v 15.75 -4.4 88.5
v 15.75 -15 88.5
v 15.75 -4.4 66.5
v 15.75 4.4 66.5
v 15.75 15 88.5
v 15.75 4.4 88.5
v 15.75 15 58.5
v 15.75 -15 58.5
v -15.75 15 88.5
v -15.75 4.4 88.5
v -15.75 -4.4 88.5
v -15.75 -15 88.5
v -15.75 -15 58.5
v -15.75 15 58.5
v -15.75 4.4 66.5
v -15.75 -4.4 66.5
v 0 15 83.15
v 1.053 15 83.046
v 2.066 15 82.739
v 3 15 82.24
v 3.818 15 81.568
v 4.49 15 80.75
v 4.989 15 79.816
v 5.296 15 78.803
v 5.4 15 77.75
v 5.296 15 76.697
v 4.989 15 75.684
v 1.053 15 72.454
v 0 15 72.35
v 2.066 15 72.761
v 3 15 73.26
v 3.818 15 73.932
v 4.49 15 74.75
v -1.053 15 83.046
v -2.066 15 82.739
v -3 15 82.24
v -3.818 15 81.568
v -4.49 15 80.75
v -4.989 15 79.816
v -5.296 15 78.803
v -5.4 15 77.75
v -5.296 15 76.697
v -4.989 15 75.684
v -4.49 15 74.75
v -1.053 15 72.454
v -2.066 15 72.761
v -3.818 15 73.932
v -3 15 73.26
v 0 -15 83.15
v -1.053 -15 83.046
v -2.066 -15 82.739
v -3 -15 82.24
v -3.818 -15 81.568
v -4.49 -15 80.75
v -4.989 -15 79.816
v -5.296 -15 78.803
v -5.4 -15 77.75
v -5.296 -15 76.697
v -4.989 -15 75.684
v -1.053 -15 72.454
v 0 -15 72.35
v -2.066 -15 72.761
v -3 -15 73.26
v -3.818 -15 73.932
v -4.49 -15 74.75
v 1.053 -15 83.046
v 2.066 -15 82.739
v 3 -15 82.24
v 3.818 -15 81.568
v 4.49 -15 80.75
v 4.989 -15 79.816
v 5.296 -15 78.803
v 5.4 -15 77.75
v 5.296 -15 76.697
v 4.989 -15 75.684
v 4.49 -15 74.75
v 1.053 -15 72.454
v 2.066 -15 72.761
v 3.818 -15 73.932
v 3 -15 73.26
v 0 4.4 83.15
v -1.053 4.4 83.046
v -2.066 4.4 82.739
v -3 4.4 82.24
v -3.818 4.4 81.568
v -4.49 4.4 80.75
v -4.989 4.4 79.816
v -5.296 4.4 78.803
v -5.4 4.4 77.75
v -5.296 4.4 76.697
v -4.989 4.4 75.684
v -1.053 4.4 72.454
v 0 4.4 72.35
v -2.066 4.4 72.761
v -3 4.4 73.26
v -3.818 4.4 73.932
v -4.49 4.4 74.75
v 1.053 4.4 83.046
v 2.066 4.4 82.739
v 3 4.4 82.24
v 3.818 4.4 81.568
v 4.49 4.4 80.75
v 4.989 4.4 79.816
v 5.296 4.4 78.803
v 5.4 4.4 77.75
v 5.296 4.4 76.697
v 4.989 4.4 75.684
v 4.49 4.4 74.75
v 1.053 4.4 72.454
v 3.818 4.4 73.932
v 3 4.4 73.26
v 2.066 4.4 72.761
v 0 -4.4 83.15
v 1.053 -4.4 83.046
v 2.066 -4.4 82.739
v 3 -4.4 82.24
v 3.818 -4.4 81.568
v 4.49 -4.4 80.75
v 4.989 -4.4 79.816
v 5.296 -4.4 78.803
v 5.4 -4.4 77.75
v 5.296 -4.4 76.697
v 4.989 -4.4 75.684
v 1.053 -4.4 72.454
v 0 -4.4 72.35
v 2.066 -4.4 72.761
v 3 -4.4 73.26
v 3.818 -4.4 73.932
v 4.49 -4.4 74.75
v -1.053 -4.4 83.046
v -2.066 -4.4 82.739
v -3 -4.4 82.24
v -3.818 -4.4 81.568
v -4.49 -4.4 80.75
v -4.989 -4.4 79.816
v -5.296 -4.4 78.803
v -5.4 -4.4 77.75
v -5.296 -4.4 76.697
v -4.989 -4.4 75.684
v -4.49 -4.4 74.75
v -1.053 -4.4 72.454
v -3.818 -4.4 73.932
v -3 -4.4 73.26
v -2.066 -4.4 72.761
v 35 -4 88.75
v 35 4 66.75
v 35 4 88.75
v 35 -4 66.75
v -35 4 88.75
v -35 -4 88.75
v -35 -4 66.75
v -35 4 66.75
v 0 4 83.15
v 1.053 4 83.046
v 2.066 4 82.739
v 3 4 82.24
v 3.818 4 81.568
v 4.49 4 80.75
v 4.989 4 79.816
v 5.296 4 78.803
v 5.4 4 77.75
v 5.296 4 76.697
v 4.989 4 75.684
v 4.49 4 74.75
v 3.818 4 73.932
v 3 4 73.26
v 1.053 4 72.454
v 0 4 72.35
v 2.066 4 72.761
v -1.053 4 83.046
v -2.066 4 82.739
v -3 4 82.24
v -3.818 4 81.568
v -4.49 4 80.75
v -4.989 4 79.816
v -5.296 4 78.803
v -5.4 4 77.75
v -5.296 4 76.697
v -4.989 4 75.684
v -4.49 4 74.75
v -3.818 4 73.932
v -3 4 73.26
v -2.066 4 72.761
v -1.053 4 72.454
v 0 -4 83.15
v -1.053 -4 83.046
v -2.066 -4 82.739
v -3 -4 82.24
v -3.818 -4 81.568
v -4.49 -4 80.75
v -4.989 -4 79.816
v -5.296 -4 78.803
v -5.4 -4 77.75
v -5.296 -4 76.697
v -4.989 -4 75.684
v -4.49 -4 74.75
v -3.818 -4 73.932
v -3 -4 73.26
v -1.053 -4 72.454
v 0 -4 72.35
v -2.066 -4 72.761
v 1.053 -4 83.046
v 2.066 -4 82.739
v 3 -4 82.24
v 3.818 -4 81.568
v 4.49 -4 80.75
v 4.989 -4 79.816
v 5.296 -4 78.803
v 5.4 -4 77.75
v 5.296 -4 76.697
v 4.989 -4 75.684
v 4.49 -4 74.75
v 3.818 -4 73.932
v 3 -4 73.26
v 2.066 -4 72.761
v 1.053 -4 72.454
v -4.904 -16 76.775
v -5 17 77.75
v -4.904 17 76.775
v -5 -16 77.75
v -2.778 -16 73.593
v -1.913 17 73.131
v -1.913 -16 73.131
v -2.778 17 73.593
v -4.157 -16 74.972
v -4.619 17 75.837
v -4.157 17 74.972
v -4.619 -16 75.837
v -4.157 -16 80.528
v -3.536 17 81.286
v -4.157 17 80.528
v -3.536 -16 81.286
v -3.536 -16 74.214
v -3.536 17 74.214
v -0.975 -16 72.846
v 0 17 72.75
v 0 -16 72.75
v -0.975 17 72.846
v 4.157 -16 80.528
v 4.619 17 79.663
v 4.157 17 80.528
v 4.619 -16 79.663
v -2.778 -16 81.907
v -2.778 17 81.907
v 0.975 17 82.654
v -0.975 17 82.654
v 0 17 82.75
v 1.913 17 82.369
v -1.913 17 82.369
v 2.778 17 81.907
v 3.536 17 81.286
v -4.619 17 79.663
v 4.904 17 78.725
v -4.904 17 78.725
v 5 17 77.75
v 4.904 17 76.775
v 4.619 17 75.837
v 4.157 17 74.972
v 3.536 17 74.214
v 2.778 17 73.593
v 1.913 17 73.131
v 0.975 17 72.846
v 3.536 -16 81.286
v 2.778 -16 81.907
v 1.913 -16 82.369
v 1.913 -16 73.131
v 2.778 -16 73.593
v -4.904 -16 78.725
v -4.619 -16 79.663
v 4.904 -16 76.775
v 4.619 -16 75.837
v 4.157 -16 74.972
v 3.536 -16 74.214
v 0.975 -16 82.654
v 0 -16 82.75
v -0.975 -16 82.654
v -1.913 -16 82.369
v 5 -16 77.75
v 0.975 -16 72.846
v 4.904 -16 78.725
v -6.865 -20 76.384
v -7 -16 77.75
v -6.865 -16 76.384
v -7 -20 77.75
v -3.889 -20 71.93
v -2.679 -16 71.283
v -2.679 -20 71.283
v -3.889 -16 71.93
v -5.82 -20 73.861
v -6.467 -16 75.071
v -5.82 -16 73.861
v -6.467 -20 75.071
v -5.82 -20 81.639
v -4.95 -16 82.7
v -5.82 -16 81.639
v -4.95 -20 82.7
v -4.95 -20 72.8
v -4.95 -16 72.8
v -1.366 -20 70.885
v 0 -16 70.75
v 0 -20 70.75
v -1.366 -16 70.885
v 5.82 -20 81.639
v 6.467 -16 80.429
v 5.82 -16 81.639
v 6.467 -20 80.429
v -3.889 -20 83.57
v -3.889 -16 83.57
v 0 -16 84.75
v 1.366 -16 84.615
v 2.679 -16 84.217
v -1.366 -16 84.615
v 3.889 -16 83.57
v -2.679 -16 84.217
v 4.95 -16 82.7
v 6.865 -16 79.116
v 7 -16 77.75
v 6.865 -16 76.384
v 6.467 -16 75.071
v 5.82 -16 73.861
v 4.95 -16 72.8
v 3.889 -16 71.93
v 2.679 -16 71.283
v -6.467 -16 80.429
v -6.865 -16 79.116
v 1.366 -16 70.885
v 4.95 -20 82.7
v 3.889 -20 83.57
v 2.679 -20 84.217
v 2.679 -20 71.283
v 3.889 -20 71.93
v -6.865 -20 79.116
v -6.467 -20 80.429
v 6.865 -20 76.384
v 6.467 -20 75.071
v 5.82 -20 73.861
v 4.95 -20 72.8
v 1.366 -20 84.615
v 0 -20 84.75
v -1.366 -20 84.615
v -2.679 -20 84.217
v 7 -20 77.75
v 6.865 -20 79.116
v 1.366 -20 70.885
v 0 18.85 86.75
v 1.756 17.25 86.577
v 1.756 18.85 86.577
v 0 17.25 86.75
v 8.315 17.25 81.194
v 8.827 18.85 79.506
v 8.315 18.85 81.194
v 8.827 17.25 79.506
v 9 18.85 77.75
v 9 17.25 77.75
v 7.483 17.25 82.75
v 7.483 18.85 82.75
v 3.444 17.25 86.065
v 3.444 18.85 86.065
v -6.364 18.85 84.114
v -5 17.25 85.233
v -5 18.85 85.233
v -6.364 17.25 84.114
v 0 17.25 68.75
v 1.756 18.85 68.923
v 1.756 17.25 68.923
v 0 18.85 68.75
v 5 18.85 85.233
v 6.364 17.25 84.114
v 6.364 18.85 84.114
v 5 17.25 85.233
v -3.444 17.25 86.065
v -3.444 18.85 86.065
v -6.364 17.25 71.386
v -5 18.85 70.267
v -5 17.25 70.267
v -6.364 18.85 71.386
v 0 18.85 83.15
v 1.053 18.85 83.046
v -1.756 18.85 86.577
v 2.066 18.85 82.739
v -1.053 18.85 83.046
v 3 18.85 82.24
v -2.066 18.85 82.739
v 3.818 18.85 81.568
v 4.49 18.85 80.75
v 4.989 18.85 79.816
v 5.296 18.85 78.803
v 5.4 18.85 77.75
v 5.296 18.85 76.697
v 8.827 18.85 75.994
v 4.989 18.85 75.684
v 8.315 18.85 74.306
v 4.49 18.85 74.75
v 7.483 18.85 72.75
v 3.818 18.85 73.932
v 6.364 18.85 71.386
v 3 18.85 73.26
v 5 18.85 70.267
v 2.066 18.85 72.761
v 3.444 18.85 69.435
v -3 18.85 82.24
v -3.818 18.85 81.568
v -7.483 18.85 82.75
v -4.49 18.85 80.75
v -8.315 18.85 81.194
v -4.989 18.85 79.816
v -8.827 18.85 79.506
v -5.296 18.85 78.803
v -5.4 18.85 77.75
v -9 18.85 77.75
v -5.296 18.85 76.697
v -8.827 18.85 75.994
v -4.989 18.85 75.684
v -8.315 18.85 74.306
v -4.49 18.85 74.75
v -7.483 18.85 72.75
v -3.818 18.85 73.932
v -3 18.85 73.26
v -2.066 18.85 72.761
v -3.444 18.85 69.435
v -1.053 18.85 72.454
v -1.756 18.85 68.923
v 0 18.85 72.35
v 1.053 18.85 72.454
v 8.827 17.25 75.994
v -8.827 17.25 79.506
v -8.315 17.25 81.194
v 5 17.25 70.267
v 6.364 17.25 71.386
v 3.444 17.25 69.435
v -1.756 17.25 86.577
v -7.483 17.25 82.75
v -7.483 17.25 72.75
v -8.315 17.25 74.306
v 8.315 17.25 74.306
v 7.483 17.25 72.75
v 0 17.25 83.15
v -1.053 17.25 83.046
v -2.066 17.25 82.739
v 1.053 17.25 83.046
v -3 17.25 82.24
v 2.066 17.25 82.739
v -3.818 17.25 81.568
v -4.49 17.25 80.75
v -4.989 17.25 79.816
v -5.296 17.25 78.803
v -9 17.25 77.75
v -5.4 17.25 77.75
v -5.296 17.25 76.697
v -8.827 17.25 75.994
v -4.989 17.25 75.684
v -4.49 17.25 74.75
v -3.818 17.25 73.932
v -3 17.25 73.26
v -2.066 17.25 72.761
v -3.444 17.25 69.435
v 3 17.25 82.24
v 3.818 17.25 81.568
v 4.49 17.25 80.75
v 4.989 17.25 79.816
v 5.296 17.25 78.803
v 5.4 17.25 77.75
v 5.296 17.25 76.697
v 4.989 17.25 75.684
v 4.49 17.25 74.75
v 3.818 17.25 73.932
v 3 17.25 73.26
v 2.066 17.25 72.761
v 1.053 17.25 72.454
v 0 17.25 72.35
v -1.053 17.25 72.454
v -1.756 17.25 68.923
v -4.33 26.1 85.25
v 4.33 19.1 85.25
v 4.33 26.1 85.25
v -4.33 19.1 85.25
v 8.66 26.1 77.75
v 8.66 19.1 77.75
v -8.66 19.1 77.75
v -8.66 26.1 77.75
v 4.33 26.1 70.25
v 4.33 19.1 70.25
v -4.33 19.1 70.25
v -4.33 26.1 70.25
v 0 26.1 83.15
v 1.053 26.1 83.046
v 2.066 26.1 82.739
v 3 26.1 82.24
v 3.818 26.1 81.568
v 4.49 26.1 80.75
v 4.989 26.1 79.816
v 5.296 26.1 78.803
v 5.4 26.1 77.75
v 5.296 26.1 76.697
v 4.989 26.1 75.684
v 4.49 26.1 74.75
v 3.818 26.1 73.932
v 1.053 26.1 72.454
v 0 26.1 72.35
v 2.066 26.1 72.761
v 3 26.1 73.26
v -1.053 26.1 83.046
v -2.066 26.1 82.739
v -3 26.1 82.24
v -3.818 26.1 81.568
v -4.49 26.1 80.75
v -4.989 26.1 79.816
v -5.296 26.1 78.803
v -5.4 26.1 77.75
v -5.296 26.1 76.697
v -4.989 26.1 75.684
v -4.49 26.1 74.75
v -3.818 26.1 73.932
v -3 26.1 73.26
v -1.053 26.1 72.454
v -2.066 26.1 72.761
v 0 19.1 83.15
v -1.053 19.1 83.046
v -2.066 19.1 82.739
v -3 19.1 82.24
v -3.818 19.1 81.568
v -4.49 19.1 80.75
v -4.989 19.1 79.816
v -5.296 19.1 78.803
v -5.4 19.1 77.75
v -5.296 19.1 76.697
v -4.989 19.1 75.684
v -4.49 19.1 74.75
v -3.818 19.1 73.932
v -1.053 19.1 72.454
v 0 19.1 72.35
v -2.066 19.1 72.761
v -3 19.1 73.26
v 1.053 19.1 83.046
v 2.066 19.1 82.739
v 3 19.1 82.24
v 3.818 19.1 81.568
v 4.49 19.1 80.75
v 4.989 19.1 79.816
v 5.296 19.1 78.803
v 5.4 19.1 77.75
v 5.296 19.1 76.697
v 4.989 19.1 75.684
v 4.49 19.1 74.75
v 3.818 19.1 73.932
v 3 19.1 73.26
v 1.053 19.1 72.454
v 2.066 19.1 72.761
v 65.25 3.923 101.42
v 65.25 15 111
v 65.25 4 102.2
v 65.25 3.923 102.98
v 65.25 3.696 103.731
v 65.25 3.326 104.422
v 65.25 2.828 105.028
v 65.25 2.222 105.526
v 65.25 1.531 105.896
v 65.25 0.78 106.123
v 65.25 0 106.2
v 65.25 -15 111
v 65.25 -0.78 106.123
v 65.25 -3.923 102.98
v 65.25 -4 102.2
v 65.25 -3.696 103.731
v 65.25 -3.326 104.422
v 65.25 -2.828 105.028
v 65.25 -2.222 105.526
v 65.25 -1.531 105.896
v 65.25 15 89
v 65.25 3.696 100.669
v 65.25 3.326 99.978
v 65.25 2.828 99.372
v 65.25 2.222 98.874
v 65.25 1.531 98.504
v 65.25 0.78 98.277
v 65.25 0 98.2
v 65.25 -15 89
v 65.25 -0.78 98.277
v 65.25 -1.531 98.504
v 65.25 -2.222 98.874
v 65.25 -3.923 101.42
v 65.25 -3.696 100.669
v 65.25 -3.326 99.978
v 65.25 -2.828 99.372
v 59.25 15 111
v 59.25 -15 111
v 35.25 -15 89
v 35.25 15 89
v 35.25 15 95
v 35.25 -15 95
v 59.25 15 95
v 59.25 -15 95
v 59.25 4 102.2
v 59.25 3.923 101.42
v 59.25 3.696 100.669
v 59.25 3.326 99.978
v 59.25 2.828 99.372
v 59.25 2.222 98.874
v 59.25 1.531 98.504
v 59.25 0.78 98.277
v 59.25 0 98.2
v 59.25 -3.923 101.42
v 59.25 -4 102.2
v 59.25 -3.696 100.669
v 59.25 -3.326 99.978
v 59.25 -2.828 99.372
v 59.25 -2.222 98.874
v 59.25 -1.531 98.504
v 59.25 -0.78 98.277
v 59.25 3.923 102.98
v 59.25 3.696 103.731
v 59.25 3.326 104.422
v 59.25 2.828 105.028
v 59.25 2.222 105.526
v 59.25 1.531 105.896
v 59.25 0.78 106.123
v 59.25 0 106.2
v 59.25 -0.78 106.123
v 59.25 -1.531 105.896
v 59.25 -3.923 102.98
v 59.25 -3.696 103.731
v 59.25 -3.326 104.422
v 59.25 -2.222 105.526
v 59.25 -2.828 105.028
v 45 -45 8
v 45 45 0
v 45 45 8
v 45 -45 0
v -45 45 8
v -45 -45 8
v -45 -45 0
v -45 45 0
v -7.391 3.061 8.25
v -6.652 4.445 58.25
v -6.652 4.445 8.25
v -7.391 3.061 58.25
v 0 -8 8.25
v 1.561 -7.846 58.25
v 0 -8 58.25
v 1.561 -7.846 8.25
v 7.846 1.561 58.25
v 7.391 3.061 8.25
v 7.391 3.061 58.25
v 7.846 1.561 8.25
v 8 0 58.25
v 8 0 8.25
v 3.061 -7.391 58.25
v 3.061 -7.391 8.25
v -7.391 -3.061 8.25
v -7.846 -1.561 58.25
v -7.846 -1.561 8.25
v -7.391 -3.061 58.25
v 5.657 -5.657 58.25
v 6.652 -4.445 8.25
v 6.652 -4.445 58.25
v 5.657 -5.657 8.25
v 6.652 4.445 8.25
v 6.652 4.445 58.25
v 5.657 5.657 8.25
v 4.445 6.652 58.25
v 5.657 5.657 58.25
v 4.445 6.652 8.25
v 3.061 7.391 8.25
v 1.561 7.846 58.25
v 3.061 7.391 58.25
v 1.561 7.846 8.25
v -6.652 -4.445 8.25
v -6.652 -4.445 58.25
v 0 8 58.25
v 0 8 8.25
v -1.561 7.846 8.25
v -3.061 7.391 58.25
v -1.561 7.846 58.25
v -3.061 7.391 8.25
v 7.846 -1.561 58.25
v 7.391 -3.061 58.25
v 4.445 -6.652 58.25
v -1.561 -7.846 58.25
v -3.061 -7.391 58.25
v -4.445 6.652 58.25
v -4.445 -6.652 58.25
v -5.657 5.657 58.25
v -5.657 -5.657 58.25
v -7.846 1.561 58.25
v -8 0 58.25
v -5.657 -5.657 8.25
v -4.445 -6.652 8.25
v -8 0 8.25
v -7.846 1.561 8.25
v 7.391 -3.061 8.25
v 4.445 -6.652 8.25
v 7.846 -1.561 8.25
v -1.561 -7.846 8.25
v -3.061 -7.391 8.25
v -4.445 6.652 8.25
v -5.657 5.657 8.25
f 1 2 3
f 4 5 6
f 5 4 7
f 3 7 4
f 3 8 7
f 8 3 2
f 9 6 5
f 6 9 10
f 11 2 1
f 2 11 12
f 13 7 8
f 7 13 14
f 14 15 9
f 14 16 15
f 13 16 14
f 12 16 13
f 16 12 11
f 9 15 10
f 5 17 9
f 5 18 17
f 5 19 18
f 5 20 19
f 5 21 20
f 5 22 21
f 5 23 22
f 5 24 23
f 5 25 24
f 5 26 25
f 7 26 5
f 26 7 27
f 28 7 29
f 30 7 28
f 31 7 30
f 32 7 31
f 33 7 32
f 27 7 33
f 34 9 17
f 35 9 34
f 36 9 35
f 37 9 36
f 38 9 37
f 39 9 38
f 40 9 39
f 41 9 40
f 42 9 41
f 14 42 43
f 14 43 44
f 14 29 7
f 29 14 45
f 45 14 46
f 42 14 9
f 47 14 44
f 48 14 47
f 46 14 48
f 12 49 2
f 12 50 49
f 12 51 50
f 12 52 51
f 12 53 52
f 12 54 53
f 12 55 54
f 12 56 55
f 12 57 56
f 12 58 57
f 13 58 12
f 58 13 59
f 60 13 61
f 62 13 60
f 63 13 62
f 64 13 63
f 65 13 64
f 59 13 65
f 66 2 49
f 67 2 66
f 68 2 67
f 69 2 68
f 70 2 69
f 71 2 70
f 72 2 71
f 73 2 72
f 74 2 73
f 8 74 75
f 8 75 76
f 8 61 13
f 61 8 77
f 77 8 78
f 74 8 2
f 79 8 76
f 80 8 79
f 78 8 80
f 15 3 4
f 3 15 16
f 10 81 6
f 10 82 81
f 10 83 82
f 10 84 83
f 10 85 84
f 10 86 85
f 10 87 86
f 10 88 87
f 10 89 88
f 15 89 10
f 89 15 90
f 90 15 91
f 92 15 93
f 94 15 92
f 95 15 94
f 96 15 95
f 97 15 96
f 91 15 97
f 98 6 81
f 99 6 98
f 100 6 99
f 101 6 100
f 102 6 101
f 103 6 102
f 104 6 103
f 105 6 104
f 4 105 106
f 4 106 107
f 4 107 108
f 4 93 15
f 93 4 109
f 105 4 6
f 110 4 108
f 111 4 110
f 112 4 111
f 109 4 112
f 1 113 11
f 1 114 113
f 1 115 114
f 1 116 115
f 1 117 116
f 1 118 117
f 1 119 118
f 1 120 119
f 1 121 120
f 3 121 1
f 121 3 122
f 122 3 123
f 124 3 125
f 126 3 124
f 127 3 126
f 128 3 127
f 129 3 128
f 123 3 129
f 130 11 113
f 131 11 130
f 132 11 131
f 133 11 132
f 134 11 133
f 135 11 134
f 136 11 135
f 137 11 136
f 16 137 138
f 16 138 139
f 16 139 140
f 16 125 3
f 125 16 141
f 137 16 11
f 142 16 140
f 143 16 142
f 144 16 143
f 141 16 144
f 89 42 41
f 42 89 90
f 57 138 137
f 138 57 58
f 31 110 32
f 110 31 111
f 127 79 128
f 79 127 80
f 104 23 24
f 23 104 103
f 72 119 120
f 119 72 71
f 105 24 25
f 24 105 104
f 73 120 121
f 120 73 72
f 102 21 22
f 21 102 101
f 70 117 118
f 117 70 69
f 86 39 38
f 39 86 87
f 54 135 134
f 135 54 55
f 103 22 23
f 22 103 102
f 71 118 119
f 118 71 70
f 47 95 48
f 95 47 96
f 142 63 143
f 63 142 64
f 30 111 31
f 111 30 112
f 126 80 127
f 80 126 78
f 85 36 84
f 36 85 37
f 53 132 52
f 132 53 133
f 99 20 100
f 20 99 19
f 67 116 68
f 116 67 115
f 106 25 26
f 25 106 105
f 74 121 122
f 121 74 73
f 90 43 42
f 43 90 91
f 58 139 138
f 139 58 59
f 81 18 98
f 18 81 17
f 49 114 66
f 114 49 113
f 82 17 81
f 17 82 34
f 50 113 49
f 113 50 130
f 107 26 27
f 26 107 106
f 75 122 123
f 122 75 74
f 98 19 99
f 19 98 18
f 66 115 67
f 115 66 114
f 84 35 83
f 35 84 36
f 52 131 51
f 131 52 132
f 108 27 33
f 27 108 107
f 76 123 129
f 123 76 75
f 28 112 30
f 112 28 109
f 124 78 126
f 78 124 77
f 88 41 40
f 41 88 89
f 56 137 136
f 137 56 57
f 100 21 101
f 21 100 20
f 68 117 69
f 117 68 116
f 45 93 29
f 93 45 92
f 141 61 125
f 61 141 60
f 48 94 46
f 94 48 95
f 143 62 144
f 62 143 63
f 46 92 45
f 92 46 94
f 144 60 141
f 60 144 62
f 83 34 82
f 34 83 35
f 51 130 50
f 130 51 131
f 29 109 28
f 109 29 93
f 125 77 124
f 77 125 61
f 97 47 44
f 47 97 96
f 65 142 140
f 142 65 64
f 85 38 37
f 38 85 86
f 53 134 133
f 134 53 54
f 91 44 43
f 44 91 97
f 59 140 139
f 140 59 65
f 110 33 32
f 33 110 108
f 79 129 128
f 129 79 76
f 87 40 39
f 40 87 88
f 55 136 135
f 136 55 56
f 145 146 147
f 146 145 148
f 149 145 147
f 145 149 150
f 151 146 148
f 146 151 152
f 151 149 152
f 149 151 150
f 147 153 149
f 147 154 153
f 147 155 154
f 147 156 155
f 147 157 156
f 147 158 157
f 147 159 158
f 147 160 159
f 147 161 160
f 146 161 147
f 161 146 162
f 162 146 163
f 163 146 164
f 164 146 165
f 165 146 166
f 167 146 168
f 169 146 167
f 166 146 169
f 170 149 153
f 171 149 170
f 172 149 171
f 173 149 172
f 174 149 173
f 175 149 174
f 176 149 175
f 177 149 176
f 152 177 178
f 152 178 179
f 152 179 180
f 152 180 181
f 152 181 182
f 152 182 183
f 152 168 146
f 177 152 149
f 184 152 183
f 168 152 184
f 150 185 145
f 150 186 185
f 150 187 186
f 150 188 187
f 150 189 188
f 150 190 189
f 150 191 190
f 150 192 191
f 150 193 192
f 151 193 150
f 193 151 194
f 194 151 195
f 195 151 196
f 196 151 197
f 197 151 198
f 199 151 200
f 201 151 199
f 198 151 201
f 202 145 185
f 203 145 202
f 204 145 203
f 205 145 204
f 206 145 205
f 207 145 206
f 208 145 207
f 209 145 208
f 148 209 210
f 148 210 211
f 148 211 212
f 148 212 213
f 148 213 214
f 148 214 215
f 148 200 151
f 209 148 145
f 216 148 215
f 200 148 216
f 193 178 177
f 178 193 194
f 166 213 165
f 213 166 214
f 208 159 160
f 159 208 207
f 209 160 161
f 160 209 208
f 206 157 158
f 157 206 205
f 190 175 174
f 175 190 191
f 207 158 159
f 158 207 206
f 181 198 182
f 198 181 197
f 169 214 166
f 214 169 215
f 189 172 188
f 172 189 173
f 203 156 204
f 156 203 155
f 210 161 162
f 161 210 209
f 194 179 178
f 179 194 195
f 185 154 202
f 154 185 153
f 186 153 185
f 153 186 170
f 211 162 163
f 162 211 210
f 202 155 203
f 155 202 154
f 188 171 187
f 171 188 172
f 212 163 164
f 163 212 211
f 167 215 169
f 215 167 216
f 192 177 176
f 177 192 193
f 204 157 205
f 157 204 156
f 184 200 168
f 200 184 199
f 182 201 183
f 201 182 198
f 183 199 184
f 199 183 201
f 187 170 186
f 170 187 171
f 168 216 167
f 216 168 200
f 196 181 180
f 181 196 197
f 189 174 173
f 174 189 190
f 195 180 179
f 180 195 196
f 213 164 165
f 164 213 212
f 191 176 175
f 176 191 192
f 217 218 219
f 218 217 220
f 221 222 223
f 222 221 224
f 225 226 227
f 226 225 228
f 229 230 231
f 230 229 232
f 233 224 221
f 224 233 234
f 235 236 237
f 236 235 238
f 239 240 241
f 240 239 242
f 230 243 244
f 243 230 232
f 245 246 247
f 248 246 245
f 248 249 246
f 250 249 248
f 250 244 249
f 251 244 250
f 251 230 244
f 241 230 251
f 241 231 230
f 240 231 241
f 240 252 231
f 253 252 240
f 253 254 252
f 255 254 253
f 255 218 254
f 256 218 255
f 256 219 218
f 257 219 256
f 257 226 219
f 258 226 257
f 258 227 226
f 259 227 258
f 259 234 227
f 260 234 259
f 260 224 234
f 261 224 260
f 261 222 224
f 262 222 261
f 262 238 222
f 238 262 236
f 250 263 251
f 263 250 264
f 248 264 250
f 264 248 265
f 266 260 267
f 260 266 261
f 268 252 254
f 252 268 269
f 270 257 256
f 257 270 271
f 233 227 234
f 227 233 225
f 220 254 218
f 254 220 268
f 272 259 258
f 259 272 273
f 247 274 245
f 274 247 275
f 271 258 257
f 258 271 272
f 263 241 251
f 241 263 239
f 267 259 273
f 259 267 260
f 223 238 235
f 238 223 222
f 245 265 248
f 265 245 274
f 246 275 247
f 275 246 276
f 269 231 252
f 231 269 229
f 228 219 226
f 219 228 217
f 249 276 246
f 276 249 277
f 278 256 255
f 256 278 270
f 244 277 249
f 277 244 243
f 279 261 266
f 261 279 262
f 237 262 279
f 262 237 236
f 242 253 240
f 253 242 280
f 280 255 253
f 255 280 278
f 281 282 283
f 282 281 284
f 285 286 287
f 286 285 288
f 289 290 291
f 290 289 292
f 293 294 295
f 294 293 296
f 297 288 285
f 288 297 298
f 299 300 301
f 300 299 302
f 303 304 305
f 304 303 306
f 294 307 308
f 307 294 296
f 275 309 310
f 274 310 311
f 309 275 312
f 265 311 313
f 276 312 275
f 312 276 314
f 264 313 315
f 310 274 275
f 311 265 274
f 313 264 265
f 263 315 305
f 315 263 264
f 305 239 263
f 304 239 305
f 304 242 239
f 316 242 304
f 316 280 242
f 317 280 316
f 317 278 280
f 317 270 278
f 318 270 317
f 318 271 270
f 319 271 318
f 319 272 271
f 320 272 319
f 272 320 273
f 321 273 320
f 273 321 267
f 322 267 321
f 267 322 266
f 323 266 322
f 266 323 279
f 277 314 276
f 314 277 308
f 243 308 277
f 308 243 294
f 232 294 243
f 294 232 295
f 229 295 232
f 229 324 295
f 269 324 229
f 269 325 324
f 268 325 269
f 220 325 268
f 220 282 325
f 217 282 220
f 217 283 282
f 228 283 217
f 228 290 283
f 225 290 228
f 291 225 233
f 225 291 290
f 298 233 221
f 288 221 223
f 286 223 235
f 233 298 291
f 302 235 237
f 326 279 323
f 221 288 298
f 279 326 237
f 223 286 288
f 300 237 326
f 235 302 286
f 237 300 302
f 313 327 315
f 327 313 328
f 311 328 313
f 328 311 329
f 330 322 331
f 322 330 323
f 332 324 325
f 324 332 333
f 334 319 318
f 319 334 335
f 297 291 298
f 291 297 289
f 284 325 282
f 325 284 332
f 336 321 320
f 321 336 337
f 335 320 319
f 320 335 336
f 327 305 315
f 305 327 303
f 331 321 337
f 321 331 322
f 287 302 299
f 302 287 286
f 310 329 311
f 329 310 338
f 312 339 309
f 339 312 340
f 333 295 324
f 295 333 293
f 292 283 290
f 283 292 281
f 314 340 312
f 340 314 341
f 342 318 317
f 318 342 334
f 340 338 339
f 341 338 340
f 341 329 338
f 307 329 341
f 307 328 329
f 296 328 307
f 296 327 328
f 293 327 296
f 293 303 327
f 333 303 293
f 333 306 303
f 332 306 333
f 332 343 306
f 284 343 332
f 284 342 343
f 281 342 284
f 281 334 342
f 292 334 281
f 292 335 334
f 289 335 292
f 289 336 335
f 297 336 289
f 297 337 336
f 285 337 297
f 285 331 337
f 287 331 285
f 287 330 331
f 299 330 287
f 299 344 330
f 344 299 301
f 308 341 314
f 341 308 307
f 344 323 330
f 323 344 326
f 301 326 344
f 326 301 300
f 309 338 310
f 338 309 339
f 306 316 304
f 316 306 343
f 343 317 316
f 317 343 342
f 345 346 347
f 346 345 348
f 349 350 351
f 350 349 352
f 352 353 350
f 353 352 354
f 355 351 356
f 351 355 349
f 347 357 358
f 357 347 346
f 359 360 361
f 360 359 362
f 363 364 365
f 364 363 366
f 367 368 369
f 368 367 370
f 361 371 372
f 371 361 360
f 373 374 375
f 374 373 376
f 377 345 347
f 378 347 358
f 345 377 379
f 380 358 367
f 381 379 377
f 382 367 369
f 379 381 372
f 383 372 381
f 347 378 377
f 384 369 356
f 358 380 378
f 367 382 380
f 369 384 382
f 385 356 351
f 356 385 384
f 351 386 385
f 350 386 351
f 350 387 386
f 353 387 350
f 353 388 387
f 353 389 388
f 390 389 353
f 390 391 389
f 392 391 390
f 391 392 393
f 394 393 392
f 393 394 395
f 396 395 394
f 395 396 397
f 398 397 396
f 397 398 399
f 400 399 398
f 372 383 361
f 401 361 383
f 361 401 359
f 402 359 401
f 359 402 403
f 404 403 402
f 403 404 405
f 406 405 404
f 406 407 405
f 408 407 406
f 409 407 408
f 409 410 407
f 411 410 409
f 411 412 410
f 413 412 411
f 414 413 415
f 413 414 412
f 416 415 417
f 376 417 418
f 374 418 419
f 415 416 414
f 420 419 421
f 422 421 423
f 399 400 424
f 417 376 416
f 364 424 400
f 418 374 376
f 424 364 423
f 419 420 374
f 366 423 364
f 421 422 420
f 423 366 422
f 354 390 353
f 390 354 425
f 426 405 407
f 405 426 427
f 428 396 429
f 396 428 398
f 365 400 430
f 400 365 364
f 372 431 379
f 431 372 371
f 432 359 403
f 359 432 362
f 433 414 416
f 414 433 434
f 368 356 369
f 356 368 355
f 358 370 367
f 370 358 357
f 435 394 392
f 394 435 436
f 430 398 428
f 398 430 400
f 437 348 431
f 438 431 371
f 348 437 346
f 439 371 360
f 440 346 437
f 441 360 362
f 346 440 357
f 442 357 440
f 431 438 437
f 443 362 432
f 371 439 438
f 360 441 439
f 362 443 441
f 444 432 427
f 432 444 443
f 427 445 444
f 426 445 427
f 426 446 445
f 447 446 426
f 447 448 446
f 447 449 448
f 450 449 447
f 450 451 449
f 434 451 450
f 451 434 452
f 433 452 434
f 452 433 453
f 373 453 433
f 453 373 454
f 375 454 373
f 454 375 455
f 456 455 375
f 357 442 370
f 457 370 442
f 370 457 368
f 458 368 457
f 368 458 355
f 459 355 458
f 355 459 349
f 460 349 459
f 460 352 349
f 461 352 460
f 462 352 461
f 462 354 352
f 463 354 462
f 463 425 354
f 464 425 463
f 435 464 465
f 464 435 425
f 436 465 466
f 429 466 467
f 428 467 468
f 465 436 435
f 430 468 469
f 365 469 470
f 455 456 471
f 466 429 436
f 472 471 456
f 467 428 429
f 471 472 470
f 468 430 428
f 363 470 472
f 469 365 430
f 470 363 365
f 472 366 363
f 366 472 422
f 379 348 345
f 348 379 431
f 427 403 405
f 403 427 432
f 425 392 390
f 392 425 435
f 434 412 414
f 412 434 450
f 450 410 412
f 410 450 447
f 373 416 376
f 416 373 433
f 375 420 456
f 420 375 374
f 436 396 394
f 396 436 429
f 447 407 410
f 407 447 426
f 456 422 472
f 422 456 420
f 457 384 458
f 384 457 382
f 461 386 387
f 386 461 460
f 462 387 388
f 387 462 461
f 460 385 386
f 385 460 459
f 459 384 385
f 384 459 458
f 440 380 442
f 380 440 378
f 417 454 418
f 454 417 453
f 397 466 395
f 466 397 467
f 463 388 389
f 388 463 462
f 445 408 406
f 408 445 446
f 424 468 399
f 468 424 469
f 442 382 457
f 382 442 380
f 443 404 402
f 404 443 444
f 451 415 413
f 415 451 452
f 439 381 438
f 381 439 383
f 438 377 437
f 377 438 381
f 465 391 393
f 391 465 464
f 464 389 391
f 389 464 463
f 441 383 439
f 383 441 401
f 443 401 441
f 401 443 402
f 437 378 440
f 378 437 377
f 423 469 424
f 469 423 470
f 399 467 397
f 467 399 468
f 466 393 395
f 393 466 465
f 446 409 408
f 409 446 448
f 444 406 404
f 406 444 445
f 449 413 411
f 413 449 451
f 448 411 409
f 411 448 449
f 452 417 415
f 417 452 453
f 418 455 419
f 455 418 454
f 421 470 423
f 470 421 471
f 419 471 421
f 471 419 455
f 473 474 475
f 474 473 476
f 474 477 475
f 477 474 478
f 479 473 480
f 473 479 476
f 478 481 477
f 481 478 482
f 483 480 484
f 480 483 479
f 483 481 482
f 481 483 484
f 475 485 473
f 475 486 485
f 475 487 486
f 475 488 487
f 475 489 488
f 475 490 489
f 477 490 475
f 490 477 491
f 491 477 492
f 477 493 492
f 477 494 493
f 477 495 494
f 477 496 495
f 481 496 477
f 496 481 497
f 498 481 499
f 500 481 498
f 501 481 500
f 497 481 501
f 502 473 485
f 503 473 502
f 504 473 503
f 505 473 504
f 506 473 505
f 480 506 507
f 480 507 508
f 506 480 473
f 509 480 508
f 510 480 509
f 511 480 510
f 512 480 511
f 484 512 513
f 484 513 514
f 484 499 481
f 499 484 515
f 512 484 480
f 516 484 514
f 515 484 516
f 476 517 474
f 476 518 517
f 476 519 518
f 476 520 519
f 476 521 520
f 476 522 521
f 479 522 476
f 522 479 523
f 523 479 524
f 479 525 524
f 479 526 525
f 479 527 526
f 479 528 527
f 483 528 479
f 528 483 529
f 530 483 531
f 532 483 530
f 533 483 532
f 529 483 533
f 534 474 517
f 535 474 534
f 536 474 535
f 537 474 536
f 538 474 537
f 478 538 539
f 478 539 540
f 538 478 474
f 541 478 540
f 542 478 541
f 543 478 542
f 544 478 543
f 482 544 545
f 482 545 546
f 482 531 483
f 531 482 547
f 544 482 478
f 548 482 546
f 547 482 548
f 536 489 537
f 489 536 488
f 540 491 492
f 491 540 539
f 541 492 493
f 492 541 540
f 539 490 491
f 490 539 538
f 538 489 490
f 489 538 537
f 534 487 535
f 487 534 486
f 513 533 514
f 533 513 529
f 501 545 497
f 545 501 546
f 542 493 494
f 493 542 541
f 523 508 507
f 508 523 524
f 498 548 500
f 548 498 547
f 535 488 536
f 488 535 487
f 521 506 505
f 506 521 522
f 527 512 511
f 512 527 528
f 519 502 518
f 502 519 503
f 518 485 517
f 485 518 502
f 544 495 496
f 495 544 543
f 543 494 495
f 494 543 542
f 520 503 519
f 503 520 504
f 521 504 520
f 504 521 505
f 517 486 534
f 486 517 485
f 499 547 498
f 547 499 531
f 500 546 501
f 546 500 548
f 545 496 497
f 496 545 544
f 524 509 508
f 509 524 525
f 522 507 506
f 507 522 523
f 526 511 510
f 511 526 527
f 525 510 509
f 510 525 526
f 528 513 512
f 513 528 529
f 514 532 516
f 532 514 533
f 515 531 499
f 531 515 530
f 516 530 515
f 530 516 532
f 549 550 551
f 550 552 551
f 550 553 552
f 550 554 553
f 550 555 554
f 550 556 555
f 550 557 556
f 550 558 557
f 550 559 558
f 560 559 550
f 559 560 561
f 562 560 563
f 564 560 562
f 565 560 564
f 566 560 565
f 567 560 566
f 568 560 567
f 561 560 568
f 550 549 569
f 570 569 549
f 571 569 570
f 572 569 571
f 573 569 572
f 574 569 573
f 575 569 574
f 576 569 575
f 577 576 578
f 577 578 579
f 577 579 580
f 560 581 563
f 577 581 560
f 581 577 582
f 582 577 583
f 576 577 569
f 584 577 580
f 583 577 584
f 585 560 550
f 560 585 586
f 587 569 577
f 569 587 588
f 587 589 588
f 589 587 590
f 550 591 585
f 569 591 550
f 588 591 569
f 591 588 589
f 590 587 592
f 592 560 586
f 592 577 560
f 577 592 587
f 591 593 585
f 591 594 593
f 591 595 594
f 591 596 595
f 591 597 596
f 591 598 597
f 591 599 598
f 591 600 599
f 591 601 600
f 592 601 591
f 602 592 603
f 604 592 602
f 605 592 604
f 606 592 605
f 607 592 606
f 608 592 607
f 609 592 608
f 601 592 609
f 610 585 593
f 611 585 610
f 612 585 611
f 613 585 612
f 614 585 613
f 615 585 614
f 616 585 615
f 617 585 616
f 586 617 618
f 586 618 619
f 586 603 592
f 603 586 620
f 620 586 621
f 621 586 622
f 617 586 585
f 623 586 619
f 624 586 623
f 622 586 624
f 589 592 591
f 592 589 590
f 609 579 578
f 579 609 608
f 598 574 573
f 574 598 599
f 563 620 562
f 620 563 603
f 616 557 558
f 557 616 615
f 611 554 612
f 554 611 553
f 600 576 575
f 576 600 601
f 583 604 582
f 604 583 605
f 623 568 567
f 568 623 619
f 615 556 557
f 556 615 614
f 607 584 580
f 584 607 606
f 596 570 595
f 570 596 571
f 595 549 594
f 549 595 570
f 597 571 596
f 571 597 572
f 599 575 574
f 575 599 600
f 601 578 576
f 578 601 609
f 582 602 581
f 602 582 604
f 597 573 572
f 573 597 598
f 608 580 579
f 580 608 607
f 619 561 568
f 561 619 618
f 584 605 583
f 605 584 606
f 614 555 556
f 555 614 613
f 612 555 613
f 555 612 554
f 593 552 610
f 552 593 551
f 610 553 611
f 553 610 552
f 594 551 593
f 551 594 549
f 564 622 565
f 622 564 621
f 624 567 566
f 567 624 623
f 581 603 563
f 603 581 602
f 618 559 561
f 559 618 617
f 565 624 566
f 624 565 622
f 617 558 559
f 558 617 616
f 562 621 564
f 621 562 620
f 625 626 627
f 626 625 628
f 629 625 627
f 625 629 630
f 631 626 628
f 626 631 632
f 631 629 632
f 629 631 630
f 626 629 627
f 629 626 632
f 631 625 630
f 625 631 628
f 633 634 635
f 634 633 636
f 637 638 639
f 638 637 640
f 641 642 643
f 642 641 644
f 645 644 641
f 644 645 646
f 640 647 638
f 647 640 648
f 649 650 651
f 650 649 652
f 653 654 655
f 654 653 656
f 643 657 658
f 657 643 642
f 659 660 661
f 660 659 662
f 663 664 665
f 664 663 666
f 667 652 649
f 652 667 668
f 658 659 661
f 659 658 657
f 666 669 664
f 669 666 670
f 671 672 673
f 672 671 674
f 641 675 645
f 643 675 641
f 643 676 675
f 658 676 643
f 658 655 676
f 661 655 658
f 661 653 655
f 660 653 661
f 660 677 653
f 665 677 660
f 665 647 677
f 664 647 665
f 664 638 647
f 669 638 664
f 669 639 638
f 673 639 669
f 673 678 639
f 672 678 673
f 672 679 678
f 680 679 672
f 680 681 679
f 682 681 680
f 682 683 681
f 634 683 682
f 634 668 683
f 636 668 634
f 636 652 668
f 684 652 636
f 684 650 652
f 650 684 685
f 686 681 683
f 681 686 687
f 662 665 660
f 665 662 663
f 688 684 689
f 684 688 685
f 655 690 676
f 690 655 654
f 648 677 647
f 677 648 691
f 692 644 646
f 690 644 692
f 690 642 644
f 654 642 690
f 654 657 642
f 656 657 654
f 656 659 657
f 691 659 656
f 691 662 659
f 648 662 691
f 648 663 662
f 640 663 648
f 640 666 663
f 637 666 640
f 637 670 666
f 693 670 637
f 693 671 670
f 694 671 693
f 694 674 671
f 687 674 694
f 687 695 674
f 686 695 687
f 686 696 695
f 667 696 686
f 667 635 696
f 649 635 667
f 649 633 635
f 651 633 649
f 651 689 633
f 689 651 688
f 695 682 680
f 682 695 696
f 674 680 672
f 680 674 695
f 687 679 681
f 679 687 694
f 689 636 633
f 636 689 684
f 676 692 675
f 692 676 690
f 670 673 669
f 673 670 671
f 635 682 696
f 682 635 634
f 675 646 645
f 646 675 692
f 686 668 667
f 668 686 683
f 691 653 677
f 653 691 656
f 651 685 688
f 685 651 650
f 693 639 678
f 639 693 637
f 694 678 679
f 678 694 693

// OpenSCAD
$fn = 32;

// ------------------------------------------------------------------------
// Lamp arm: column d16 x 50 mm, arm 70 mm
// Every part is its own module, assembly() places every instance.
// ------------------------------------------------------------------------

// --- part 1 ---
module lamp_base() {
  difference() {
    translate([-45, -45, 0]) cube([90, 90, 8]);
  }
}

// --- part 2 ---
module lamp_column() {
  cylinder(h = 50, d = 16);
}

// --- part 3 ---
module head_fork() {
  difference() {
    translate([-15.75, -15, 0]) cube([31.5, 30, 30]);
    translate([-16.75, -4.4, 8]) cube([33.5, 8.8, 23]);
    translate([0, 0, 19.25]) rotate([90, 0, 0]) cylinder(h = 32, d = 10.8, center = true);
  }
}

// --- part 4 ---
module lamp_arm() {
  difference() {
    translate([-35, -4, 0]) cube([70, 8, 22]);
    translate([0, 0, 11]) rotate([90, 0, 0]) cylinder(h = 10, d = 10.8, center = true);
  }
}

// --- part 5 ---
module arm_pin() {
  rotate([0, 90, 0]) cylinder(h = 34, d = 10, center = true);
  translate([-20, 0, 0]) rotate([0, 90, 0]) cylinder(h = 4, d = 14);
}

// --- part 6 ---
module arm_washer() {
  difference() {
      translate([0, 0, 0]) cylinder(h = 1.6, d = 18);
      translate([0, 0, -1]) cylinder(h = 3.6, d = 10.8);
    }
}

// --- part 7 ---
module arm_nut() {
  difference() {
    linear_extrude(height = 7) polygon(points = [[8.66, 0], [4.33, 7.5], [-4.33, 7.5], [-8.66, 0], [-4.33, -7.5], [4.33, -7.5]]);
    translate([0, 0, -1]) cylinder(h = 9, d = 10.8);
  }
}

// --- part 8 ---
module shade_bracket() {
  difference() {
    translate([-15, -15, 0]) cube([30, 30, 22]);
    translate([-16, -16, 6]) cube([25, 32, 17]);
    translate([12, 0, 13.2]) rotate([0, 90, 0]) cylinder(h = 8, d = 8, center = true);
  }
}

// --- assembly ---
module assembly() {
  color([0.80, 0.24, 0.20]) translate([0, 0, 0]) rotate([0, 0, 0]) lamp_base();
  color([0.20, 0.45, 0.75]) translate([0, 0, 8.25]) rotate([0, 0, 0]) lamp_column();
  color([0.25, 0.62, 0.32]) translate([0, 0, 58.5]) rotate([0, 0, 0]) head_fork();
  color([0.92, 0.70, 0.18]) translate([0, 0, 66.75]) rotate([0, 0, 0]) lamp_arm();
  color([0.58, 0.35, 0.70]) translate([0, 0, 77.75]) rotate([0, 0, 90]) arm_pin();
  color([0.16, 0.66, 0.66]) translate([0, 18.85, 77.75]) rotate([90, 0, 0]) arm_washer();
  color([0.85, 0.48, 0.18]) translate([0, 26.1, 77.75]) rotate([90, 0, 0]) arm_nut();
  color([0.55, 0.60, 0.65]) translate([50.25, 0, 89]) rotate([0, 0, 0]) shade_bracket();
}

assembly();
